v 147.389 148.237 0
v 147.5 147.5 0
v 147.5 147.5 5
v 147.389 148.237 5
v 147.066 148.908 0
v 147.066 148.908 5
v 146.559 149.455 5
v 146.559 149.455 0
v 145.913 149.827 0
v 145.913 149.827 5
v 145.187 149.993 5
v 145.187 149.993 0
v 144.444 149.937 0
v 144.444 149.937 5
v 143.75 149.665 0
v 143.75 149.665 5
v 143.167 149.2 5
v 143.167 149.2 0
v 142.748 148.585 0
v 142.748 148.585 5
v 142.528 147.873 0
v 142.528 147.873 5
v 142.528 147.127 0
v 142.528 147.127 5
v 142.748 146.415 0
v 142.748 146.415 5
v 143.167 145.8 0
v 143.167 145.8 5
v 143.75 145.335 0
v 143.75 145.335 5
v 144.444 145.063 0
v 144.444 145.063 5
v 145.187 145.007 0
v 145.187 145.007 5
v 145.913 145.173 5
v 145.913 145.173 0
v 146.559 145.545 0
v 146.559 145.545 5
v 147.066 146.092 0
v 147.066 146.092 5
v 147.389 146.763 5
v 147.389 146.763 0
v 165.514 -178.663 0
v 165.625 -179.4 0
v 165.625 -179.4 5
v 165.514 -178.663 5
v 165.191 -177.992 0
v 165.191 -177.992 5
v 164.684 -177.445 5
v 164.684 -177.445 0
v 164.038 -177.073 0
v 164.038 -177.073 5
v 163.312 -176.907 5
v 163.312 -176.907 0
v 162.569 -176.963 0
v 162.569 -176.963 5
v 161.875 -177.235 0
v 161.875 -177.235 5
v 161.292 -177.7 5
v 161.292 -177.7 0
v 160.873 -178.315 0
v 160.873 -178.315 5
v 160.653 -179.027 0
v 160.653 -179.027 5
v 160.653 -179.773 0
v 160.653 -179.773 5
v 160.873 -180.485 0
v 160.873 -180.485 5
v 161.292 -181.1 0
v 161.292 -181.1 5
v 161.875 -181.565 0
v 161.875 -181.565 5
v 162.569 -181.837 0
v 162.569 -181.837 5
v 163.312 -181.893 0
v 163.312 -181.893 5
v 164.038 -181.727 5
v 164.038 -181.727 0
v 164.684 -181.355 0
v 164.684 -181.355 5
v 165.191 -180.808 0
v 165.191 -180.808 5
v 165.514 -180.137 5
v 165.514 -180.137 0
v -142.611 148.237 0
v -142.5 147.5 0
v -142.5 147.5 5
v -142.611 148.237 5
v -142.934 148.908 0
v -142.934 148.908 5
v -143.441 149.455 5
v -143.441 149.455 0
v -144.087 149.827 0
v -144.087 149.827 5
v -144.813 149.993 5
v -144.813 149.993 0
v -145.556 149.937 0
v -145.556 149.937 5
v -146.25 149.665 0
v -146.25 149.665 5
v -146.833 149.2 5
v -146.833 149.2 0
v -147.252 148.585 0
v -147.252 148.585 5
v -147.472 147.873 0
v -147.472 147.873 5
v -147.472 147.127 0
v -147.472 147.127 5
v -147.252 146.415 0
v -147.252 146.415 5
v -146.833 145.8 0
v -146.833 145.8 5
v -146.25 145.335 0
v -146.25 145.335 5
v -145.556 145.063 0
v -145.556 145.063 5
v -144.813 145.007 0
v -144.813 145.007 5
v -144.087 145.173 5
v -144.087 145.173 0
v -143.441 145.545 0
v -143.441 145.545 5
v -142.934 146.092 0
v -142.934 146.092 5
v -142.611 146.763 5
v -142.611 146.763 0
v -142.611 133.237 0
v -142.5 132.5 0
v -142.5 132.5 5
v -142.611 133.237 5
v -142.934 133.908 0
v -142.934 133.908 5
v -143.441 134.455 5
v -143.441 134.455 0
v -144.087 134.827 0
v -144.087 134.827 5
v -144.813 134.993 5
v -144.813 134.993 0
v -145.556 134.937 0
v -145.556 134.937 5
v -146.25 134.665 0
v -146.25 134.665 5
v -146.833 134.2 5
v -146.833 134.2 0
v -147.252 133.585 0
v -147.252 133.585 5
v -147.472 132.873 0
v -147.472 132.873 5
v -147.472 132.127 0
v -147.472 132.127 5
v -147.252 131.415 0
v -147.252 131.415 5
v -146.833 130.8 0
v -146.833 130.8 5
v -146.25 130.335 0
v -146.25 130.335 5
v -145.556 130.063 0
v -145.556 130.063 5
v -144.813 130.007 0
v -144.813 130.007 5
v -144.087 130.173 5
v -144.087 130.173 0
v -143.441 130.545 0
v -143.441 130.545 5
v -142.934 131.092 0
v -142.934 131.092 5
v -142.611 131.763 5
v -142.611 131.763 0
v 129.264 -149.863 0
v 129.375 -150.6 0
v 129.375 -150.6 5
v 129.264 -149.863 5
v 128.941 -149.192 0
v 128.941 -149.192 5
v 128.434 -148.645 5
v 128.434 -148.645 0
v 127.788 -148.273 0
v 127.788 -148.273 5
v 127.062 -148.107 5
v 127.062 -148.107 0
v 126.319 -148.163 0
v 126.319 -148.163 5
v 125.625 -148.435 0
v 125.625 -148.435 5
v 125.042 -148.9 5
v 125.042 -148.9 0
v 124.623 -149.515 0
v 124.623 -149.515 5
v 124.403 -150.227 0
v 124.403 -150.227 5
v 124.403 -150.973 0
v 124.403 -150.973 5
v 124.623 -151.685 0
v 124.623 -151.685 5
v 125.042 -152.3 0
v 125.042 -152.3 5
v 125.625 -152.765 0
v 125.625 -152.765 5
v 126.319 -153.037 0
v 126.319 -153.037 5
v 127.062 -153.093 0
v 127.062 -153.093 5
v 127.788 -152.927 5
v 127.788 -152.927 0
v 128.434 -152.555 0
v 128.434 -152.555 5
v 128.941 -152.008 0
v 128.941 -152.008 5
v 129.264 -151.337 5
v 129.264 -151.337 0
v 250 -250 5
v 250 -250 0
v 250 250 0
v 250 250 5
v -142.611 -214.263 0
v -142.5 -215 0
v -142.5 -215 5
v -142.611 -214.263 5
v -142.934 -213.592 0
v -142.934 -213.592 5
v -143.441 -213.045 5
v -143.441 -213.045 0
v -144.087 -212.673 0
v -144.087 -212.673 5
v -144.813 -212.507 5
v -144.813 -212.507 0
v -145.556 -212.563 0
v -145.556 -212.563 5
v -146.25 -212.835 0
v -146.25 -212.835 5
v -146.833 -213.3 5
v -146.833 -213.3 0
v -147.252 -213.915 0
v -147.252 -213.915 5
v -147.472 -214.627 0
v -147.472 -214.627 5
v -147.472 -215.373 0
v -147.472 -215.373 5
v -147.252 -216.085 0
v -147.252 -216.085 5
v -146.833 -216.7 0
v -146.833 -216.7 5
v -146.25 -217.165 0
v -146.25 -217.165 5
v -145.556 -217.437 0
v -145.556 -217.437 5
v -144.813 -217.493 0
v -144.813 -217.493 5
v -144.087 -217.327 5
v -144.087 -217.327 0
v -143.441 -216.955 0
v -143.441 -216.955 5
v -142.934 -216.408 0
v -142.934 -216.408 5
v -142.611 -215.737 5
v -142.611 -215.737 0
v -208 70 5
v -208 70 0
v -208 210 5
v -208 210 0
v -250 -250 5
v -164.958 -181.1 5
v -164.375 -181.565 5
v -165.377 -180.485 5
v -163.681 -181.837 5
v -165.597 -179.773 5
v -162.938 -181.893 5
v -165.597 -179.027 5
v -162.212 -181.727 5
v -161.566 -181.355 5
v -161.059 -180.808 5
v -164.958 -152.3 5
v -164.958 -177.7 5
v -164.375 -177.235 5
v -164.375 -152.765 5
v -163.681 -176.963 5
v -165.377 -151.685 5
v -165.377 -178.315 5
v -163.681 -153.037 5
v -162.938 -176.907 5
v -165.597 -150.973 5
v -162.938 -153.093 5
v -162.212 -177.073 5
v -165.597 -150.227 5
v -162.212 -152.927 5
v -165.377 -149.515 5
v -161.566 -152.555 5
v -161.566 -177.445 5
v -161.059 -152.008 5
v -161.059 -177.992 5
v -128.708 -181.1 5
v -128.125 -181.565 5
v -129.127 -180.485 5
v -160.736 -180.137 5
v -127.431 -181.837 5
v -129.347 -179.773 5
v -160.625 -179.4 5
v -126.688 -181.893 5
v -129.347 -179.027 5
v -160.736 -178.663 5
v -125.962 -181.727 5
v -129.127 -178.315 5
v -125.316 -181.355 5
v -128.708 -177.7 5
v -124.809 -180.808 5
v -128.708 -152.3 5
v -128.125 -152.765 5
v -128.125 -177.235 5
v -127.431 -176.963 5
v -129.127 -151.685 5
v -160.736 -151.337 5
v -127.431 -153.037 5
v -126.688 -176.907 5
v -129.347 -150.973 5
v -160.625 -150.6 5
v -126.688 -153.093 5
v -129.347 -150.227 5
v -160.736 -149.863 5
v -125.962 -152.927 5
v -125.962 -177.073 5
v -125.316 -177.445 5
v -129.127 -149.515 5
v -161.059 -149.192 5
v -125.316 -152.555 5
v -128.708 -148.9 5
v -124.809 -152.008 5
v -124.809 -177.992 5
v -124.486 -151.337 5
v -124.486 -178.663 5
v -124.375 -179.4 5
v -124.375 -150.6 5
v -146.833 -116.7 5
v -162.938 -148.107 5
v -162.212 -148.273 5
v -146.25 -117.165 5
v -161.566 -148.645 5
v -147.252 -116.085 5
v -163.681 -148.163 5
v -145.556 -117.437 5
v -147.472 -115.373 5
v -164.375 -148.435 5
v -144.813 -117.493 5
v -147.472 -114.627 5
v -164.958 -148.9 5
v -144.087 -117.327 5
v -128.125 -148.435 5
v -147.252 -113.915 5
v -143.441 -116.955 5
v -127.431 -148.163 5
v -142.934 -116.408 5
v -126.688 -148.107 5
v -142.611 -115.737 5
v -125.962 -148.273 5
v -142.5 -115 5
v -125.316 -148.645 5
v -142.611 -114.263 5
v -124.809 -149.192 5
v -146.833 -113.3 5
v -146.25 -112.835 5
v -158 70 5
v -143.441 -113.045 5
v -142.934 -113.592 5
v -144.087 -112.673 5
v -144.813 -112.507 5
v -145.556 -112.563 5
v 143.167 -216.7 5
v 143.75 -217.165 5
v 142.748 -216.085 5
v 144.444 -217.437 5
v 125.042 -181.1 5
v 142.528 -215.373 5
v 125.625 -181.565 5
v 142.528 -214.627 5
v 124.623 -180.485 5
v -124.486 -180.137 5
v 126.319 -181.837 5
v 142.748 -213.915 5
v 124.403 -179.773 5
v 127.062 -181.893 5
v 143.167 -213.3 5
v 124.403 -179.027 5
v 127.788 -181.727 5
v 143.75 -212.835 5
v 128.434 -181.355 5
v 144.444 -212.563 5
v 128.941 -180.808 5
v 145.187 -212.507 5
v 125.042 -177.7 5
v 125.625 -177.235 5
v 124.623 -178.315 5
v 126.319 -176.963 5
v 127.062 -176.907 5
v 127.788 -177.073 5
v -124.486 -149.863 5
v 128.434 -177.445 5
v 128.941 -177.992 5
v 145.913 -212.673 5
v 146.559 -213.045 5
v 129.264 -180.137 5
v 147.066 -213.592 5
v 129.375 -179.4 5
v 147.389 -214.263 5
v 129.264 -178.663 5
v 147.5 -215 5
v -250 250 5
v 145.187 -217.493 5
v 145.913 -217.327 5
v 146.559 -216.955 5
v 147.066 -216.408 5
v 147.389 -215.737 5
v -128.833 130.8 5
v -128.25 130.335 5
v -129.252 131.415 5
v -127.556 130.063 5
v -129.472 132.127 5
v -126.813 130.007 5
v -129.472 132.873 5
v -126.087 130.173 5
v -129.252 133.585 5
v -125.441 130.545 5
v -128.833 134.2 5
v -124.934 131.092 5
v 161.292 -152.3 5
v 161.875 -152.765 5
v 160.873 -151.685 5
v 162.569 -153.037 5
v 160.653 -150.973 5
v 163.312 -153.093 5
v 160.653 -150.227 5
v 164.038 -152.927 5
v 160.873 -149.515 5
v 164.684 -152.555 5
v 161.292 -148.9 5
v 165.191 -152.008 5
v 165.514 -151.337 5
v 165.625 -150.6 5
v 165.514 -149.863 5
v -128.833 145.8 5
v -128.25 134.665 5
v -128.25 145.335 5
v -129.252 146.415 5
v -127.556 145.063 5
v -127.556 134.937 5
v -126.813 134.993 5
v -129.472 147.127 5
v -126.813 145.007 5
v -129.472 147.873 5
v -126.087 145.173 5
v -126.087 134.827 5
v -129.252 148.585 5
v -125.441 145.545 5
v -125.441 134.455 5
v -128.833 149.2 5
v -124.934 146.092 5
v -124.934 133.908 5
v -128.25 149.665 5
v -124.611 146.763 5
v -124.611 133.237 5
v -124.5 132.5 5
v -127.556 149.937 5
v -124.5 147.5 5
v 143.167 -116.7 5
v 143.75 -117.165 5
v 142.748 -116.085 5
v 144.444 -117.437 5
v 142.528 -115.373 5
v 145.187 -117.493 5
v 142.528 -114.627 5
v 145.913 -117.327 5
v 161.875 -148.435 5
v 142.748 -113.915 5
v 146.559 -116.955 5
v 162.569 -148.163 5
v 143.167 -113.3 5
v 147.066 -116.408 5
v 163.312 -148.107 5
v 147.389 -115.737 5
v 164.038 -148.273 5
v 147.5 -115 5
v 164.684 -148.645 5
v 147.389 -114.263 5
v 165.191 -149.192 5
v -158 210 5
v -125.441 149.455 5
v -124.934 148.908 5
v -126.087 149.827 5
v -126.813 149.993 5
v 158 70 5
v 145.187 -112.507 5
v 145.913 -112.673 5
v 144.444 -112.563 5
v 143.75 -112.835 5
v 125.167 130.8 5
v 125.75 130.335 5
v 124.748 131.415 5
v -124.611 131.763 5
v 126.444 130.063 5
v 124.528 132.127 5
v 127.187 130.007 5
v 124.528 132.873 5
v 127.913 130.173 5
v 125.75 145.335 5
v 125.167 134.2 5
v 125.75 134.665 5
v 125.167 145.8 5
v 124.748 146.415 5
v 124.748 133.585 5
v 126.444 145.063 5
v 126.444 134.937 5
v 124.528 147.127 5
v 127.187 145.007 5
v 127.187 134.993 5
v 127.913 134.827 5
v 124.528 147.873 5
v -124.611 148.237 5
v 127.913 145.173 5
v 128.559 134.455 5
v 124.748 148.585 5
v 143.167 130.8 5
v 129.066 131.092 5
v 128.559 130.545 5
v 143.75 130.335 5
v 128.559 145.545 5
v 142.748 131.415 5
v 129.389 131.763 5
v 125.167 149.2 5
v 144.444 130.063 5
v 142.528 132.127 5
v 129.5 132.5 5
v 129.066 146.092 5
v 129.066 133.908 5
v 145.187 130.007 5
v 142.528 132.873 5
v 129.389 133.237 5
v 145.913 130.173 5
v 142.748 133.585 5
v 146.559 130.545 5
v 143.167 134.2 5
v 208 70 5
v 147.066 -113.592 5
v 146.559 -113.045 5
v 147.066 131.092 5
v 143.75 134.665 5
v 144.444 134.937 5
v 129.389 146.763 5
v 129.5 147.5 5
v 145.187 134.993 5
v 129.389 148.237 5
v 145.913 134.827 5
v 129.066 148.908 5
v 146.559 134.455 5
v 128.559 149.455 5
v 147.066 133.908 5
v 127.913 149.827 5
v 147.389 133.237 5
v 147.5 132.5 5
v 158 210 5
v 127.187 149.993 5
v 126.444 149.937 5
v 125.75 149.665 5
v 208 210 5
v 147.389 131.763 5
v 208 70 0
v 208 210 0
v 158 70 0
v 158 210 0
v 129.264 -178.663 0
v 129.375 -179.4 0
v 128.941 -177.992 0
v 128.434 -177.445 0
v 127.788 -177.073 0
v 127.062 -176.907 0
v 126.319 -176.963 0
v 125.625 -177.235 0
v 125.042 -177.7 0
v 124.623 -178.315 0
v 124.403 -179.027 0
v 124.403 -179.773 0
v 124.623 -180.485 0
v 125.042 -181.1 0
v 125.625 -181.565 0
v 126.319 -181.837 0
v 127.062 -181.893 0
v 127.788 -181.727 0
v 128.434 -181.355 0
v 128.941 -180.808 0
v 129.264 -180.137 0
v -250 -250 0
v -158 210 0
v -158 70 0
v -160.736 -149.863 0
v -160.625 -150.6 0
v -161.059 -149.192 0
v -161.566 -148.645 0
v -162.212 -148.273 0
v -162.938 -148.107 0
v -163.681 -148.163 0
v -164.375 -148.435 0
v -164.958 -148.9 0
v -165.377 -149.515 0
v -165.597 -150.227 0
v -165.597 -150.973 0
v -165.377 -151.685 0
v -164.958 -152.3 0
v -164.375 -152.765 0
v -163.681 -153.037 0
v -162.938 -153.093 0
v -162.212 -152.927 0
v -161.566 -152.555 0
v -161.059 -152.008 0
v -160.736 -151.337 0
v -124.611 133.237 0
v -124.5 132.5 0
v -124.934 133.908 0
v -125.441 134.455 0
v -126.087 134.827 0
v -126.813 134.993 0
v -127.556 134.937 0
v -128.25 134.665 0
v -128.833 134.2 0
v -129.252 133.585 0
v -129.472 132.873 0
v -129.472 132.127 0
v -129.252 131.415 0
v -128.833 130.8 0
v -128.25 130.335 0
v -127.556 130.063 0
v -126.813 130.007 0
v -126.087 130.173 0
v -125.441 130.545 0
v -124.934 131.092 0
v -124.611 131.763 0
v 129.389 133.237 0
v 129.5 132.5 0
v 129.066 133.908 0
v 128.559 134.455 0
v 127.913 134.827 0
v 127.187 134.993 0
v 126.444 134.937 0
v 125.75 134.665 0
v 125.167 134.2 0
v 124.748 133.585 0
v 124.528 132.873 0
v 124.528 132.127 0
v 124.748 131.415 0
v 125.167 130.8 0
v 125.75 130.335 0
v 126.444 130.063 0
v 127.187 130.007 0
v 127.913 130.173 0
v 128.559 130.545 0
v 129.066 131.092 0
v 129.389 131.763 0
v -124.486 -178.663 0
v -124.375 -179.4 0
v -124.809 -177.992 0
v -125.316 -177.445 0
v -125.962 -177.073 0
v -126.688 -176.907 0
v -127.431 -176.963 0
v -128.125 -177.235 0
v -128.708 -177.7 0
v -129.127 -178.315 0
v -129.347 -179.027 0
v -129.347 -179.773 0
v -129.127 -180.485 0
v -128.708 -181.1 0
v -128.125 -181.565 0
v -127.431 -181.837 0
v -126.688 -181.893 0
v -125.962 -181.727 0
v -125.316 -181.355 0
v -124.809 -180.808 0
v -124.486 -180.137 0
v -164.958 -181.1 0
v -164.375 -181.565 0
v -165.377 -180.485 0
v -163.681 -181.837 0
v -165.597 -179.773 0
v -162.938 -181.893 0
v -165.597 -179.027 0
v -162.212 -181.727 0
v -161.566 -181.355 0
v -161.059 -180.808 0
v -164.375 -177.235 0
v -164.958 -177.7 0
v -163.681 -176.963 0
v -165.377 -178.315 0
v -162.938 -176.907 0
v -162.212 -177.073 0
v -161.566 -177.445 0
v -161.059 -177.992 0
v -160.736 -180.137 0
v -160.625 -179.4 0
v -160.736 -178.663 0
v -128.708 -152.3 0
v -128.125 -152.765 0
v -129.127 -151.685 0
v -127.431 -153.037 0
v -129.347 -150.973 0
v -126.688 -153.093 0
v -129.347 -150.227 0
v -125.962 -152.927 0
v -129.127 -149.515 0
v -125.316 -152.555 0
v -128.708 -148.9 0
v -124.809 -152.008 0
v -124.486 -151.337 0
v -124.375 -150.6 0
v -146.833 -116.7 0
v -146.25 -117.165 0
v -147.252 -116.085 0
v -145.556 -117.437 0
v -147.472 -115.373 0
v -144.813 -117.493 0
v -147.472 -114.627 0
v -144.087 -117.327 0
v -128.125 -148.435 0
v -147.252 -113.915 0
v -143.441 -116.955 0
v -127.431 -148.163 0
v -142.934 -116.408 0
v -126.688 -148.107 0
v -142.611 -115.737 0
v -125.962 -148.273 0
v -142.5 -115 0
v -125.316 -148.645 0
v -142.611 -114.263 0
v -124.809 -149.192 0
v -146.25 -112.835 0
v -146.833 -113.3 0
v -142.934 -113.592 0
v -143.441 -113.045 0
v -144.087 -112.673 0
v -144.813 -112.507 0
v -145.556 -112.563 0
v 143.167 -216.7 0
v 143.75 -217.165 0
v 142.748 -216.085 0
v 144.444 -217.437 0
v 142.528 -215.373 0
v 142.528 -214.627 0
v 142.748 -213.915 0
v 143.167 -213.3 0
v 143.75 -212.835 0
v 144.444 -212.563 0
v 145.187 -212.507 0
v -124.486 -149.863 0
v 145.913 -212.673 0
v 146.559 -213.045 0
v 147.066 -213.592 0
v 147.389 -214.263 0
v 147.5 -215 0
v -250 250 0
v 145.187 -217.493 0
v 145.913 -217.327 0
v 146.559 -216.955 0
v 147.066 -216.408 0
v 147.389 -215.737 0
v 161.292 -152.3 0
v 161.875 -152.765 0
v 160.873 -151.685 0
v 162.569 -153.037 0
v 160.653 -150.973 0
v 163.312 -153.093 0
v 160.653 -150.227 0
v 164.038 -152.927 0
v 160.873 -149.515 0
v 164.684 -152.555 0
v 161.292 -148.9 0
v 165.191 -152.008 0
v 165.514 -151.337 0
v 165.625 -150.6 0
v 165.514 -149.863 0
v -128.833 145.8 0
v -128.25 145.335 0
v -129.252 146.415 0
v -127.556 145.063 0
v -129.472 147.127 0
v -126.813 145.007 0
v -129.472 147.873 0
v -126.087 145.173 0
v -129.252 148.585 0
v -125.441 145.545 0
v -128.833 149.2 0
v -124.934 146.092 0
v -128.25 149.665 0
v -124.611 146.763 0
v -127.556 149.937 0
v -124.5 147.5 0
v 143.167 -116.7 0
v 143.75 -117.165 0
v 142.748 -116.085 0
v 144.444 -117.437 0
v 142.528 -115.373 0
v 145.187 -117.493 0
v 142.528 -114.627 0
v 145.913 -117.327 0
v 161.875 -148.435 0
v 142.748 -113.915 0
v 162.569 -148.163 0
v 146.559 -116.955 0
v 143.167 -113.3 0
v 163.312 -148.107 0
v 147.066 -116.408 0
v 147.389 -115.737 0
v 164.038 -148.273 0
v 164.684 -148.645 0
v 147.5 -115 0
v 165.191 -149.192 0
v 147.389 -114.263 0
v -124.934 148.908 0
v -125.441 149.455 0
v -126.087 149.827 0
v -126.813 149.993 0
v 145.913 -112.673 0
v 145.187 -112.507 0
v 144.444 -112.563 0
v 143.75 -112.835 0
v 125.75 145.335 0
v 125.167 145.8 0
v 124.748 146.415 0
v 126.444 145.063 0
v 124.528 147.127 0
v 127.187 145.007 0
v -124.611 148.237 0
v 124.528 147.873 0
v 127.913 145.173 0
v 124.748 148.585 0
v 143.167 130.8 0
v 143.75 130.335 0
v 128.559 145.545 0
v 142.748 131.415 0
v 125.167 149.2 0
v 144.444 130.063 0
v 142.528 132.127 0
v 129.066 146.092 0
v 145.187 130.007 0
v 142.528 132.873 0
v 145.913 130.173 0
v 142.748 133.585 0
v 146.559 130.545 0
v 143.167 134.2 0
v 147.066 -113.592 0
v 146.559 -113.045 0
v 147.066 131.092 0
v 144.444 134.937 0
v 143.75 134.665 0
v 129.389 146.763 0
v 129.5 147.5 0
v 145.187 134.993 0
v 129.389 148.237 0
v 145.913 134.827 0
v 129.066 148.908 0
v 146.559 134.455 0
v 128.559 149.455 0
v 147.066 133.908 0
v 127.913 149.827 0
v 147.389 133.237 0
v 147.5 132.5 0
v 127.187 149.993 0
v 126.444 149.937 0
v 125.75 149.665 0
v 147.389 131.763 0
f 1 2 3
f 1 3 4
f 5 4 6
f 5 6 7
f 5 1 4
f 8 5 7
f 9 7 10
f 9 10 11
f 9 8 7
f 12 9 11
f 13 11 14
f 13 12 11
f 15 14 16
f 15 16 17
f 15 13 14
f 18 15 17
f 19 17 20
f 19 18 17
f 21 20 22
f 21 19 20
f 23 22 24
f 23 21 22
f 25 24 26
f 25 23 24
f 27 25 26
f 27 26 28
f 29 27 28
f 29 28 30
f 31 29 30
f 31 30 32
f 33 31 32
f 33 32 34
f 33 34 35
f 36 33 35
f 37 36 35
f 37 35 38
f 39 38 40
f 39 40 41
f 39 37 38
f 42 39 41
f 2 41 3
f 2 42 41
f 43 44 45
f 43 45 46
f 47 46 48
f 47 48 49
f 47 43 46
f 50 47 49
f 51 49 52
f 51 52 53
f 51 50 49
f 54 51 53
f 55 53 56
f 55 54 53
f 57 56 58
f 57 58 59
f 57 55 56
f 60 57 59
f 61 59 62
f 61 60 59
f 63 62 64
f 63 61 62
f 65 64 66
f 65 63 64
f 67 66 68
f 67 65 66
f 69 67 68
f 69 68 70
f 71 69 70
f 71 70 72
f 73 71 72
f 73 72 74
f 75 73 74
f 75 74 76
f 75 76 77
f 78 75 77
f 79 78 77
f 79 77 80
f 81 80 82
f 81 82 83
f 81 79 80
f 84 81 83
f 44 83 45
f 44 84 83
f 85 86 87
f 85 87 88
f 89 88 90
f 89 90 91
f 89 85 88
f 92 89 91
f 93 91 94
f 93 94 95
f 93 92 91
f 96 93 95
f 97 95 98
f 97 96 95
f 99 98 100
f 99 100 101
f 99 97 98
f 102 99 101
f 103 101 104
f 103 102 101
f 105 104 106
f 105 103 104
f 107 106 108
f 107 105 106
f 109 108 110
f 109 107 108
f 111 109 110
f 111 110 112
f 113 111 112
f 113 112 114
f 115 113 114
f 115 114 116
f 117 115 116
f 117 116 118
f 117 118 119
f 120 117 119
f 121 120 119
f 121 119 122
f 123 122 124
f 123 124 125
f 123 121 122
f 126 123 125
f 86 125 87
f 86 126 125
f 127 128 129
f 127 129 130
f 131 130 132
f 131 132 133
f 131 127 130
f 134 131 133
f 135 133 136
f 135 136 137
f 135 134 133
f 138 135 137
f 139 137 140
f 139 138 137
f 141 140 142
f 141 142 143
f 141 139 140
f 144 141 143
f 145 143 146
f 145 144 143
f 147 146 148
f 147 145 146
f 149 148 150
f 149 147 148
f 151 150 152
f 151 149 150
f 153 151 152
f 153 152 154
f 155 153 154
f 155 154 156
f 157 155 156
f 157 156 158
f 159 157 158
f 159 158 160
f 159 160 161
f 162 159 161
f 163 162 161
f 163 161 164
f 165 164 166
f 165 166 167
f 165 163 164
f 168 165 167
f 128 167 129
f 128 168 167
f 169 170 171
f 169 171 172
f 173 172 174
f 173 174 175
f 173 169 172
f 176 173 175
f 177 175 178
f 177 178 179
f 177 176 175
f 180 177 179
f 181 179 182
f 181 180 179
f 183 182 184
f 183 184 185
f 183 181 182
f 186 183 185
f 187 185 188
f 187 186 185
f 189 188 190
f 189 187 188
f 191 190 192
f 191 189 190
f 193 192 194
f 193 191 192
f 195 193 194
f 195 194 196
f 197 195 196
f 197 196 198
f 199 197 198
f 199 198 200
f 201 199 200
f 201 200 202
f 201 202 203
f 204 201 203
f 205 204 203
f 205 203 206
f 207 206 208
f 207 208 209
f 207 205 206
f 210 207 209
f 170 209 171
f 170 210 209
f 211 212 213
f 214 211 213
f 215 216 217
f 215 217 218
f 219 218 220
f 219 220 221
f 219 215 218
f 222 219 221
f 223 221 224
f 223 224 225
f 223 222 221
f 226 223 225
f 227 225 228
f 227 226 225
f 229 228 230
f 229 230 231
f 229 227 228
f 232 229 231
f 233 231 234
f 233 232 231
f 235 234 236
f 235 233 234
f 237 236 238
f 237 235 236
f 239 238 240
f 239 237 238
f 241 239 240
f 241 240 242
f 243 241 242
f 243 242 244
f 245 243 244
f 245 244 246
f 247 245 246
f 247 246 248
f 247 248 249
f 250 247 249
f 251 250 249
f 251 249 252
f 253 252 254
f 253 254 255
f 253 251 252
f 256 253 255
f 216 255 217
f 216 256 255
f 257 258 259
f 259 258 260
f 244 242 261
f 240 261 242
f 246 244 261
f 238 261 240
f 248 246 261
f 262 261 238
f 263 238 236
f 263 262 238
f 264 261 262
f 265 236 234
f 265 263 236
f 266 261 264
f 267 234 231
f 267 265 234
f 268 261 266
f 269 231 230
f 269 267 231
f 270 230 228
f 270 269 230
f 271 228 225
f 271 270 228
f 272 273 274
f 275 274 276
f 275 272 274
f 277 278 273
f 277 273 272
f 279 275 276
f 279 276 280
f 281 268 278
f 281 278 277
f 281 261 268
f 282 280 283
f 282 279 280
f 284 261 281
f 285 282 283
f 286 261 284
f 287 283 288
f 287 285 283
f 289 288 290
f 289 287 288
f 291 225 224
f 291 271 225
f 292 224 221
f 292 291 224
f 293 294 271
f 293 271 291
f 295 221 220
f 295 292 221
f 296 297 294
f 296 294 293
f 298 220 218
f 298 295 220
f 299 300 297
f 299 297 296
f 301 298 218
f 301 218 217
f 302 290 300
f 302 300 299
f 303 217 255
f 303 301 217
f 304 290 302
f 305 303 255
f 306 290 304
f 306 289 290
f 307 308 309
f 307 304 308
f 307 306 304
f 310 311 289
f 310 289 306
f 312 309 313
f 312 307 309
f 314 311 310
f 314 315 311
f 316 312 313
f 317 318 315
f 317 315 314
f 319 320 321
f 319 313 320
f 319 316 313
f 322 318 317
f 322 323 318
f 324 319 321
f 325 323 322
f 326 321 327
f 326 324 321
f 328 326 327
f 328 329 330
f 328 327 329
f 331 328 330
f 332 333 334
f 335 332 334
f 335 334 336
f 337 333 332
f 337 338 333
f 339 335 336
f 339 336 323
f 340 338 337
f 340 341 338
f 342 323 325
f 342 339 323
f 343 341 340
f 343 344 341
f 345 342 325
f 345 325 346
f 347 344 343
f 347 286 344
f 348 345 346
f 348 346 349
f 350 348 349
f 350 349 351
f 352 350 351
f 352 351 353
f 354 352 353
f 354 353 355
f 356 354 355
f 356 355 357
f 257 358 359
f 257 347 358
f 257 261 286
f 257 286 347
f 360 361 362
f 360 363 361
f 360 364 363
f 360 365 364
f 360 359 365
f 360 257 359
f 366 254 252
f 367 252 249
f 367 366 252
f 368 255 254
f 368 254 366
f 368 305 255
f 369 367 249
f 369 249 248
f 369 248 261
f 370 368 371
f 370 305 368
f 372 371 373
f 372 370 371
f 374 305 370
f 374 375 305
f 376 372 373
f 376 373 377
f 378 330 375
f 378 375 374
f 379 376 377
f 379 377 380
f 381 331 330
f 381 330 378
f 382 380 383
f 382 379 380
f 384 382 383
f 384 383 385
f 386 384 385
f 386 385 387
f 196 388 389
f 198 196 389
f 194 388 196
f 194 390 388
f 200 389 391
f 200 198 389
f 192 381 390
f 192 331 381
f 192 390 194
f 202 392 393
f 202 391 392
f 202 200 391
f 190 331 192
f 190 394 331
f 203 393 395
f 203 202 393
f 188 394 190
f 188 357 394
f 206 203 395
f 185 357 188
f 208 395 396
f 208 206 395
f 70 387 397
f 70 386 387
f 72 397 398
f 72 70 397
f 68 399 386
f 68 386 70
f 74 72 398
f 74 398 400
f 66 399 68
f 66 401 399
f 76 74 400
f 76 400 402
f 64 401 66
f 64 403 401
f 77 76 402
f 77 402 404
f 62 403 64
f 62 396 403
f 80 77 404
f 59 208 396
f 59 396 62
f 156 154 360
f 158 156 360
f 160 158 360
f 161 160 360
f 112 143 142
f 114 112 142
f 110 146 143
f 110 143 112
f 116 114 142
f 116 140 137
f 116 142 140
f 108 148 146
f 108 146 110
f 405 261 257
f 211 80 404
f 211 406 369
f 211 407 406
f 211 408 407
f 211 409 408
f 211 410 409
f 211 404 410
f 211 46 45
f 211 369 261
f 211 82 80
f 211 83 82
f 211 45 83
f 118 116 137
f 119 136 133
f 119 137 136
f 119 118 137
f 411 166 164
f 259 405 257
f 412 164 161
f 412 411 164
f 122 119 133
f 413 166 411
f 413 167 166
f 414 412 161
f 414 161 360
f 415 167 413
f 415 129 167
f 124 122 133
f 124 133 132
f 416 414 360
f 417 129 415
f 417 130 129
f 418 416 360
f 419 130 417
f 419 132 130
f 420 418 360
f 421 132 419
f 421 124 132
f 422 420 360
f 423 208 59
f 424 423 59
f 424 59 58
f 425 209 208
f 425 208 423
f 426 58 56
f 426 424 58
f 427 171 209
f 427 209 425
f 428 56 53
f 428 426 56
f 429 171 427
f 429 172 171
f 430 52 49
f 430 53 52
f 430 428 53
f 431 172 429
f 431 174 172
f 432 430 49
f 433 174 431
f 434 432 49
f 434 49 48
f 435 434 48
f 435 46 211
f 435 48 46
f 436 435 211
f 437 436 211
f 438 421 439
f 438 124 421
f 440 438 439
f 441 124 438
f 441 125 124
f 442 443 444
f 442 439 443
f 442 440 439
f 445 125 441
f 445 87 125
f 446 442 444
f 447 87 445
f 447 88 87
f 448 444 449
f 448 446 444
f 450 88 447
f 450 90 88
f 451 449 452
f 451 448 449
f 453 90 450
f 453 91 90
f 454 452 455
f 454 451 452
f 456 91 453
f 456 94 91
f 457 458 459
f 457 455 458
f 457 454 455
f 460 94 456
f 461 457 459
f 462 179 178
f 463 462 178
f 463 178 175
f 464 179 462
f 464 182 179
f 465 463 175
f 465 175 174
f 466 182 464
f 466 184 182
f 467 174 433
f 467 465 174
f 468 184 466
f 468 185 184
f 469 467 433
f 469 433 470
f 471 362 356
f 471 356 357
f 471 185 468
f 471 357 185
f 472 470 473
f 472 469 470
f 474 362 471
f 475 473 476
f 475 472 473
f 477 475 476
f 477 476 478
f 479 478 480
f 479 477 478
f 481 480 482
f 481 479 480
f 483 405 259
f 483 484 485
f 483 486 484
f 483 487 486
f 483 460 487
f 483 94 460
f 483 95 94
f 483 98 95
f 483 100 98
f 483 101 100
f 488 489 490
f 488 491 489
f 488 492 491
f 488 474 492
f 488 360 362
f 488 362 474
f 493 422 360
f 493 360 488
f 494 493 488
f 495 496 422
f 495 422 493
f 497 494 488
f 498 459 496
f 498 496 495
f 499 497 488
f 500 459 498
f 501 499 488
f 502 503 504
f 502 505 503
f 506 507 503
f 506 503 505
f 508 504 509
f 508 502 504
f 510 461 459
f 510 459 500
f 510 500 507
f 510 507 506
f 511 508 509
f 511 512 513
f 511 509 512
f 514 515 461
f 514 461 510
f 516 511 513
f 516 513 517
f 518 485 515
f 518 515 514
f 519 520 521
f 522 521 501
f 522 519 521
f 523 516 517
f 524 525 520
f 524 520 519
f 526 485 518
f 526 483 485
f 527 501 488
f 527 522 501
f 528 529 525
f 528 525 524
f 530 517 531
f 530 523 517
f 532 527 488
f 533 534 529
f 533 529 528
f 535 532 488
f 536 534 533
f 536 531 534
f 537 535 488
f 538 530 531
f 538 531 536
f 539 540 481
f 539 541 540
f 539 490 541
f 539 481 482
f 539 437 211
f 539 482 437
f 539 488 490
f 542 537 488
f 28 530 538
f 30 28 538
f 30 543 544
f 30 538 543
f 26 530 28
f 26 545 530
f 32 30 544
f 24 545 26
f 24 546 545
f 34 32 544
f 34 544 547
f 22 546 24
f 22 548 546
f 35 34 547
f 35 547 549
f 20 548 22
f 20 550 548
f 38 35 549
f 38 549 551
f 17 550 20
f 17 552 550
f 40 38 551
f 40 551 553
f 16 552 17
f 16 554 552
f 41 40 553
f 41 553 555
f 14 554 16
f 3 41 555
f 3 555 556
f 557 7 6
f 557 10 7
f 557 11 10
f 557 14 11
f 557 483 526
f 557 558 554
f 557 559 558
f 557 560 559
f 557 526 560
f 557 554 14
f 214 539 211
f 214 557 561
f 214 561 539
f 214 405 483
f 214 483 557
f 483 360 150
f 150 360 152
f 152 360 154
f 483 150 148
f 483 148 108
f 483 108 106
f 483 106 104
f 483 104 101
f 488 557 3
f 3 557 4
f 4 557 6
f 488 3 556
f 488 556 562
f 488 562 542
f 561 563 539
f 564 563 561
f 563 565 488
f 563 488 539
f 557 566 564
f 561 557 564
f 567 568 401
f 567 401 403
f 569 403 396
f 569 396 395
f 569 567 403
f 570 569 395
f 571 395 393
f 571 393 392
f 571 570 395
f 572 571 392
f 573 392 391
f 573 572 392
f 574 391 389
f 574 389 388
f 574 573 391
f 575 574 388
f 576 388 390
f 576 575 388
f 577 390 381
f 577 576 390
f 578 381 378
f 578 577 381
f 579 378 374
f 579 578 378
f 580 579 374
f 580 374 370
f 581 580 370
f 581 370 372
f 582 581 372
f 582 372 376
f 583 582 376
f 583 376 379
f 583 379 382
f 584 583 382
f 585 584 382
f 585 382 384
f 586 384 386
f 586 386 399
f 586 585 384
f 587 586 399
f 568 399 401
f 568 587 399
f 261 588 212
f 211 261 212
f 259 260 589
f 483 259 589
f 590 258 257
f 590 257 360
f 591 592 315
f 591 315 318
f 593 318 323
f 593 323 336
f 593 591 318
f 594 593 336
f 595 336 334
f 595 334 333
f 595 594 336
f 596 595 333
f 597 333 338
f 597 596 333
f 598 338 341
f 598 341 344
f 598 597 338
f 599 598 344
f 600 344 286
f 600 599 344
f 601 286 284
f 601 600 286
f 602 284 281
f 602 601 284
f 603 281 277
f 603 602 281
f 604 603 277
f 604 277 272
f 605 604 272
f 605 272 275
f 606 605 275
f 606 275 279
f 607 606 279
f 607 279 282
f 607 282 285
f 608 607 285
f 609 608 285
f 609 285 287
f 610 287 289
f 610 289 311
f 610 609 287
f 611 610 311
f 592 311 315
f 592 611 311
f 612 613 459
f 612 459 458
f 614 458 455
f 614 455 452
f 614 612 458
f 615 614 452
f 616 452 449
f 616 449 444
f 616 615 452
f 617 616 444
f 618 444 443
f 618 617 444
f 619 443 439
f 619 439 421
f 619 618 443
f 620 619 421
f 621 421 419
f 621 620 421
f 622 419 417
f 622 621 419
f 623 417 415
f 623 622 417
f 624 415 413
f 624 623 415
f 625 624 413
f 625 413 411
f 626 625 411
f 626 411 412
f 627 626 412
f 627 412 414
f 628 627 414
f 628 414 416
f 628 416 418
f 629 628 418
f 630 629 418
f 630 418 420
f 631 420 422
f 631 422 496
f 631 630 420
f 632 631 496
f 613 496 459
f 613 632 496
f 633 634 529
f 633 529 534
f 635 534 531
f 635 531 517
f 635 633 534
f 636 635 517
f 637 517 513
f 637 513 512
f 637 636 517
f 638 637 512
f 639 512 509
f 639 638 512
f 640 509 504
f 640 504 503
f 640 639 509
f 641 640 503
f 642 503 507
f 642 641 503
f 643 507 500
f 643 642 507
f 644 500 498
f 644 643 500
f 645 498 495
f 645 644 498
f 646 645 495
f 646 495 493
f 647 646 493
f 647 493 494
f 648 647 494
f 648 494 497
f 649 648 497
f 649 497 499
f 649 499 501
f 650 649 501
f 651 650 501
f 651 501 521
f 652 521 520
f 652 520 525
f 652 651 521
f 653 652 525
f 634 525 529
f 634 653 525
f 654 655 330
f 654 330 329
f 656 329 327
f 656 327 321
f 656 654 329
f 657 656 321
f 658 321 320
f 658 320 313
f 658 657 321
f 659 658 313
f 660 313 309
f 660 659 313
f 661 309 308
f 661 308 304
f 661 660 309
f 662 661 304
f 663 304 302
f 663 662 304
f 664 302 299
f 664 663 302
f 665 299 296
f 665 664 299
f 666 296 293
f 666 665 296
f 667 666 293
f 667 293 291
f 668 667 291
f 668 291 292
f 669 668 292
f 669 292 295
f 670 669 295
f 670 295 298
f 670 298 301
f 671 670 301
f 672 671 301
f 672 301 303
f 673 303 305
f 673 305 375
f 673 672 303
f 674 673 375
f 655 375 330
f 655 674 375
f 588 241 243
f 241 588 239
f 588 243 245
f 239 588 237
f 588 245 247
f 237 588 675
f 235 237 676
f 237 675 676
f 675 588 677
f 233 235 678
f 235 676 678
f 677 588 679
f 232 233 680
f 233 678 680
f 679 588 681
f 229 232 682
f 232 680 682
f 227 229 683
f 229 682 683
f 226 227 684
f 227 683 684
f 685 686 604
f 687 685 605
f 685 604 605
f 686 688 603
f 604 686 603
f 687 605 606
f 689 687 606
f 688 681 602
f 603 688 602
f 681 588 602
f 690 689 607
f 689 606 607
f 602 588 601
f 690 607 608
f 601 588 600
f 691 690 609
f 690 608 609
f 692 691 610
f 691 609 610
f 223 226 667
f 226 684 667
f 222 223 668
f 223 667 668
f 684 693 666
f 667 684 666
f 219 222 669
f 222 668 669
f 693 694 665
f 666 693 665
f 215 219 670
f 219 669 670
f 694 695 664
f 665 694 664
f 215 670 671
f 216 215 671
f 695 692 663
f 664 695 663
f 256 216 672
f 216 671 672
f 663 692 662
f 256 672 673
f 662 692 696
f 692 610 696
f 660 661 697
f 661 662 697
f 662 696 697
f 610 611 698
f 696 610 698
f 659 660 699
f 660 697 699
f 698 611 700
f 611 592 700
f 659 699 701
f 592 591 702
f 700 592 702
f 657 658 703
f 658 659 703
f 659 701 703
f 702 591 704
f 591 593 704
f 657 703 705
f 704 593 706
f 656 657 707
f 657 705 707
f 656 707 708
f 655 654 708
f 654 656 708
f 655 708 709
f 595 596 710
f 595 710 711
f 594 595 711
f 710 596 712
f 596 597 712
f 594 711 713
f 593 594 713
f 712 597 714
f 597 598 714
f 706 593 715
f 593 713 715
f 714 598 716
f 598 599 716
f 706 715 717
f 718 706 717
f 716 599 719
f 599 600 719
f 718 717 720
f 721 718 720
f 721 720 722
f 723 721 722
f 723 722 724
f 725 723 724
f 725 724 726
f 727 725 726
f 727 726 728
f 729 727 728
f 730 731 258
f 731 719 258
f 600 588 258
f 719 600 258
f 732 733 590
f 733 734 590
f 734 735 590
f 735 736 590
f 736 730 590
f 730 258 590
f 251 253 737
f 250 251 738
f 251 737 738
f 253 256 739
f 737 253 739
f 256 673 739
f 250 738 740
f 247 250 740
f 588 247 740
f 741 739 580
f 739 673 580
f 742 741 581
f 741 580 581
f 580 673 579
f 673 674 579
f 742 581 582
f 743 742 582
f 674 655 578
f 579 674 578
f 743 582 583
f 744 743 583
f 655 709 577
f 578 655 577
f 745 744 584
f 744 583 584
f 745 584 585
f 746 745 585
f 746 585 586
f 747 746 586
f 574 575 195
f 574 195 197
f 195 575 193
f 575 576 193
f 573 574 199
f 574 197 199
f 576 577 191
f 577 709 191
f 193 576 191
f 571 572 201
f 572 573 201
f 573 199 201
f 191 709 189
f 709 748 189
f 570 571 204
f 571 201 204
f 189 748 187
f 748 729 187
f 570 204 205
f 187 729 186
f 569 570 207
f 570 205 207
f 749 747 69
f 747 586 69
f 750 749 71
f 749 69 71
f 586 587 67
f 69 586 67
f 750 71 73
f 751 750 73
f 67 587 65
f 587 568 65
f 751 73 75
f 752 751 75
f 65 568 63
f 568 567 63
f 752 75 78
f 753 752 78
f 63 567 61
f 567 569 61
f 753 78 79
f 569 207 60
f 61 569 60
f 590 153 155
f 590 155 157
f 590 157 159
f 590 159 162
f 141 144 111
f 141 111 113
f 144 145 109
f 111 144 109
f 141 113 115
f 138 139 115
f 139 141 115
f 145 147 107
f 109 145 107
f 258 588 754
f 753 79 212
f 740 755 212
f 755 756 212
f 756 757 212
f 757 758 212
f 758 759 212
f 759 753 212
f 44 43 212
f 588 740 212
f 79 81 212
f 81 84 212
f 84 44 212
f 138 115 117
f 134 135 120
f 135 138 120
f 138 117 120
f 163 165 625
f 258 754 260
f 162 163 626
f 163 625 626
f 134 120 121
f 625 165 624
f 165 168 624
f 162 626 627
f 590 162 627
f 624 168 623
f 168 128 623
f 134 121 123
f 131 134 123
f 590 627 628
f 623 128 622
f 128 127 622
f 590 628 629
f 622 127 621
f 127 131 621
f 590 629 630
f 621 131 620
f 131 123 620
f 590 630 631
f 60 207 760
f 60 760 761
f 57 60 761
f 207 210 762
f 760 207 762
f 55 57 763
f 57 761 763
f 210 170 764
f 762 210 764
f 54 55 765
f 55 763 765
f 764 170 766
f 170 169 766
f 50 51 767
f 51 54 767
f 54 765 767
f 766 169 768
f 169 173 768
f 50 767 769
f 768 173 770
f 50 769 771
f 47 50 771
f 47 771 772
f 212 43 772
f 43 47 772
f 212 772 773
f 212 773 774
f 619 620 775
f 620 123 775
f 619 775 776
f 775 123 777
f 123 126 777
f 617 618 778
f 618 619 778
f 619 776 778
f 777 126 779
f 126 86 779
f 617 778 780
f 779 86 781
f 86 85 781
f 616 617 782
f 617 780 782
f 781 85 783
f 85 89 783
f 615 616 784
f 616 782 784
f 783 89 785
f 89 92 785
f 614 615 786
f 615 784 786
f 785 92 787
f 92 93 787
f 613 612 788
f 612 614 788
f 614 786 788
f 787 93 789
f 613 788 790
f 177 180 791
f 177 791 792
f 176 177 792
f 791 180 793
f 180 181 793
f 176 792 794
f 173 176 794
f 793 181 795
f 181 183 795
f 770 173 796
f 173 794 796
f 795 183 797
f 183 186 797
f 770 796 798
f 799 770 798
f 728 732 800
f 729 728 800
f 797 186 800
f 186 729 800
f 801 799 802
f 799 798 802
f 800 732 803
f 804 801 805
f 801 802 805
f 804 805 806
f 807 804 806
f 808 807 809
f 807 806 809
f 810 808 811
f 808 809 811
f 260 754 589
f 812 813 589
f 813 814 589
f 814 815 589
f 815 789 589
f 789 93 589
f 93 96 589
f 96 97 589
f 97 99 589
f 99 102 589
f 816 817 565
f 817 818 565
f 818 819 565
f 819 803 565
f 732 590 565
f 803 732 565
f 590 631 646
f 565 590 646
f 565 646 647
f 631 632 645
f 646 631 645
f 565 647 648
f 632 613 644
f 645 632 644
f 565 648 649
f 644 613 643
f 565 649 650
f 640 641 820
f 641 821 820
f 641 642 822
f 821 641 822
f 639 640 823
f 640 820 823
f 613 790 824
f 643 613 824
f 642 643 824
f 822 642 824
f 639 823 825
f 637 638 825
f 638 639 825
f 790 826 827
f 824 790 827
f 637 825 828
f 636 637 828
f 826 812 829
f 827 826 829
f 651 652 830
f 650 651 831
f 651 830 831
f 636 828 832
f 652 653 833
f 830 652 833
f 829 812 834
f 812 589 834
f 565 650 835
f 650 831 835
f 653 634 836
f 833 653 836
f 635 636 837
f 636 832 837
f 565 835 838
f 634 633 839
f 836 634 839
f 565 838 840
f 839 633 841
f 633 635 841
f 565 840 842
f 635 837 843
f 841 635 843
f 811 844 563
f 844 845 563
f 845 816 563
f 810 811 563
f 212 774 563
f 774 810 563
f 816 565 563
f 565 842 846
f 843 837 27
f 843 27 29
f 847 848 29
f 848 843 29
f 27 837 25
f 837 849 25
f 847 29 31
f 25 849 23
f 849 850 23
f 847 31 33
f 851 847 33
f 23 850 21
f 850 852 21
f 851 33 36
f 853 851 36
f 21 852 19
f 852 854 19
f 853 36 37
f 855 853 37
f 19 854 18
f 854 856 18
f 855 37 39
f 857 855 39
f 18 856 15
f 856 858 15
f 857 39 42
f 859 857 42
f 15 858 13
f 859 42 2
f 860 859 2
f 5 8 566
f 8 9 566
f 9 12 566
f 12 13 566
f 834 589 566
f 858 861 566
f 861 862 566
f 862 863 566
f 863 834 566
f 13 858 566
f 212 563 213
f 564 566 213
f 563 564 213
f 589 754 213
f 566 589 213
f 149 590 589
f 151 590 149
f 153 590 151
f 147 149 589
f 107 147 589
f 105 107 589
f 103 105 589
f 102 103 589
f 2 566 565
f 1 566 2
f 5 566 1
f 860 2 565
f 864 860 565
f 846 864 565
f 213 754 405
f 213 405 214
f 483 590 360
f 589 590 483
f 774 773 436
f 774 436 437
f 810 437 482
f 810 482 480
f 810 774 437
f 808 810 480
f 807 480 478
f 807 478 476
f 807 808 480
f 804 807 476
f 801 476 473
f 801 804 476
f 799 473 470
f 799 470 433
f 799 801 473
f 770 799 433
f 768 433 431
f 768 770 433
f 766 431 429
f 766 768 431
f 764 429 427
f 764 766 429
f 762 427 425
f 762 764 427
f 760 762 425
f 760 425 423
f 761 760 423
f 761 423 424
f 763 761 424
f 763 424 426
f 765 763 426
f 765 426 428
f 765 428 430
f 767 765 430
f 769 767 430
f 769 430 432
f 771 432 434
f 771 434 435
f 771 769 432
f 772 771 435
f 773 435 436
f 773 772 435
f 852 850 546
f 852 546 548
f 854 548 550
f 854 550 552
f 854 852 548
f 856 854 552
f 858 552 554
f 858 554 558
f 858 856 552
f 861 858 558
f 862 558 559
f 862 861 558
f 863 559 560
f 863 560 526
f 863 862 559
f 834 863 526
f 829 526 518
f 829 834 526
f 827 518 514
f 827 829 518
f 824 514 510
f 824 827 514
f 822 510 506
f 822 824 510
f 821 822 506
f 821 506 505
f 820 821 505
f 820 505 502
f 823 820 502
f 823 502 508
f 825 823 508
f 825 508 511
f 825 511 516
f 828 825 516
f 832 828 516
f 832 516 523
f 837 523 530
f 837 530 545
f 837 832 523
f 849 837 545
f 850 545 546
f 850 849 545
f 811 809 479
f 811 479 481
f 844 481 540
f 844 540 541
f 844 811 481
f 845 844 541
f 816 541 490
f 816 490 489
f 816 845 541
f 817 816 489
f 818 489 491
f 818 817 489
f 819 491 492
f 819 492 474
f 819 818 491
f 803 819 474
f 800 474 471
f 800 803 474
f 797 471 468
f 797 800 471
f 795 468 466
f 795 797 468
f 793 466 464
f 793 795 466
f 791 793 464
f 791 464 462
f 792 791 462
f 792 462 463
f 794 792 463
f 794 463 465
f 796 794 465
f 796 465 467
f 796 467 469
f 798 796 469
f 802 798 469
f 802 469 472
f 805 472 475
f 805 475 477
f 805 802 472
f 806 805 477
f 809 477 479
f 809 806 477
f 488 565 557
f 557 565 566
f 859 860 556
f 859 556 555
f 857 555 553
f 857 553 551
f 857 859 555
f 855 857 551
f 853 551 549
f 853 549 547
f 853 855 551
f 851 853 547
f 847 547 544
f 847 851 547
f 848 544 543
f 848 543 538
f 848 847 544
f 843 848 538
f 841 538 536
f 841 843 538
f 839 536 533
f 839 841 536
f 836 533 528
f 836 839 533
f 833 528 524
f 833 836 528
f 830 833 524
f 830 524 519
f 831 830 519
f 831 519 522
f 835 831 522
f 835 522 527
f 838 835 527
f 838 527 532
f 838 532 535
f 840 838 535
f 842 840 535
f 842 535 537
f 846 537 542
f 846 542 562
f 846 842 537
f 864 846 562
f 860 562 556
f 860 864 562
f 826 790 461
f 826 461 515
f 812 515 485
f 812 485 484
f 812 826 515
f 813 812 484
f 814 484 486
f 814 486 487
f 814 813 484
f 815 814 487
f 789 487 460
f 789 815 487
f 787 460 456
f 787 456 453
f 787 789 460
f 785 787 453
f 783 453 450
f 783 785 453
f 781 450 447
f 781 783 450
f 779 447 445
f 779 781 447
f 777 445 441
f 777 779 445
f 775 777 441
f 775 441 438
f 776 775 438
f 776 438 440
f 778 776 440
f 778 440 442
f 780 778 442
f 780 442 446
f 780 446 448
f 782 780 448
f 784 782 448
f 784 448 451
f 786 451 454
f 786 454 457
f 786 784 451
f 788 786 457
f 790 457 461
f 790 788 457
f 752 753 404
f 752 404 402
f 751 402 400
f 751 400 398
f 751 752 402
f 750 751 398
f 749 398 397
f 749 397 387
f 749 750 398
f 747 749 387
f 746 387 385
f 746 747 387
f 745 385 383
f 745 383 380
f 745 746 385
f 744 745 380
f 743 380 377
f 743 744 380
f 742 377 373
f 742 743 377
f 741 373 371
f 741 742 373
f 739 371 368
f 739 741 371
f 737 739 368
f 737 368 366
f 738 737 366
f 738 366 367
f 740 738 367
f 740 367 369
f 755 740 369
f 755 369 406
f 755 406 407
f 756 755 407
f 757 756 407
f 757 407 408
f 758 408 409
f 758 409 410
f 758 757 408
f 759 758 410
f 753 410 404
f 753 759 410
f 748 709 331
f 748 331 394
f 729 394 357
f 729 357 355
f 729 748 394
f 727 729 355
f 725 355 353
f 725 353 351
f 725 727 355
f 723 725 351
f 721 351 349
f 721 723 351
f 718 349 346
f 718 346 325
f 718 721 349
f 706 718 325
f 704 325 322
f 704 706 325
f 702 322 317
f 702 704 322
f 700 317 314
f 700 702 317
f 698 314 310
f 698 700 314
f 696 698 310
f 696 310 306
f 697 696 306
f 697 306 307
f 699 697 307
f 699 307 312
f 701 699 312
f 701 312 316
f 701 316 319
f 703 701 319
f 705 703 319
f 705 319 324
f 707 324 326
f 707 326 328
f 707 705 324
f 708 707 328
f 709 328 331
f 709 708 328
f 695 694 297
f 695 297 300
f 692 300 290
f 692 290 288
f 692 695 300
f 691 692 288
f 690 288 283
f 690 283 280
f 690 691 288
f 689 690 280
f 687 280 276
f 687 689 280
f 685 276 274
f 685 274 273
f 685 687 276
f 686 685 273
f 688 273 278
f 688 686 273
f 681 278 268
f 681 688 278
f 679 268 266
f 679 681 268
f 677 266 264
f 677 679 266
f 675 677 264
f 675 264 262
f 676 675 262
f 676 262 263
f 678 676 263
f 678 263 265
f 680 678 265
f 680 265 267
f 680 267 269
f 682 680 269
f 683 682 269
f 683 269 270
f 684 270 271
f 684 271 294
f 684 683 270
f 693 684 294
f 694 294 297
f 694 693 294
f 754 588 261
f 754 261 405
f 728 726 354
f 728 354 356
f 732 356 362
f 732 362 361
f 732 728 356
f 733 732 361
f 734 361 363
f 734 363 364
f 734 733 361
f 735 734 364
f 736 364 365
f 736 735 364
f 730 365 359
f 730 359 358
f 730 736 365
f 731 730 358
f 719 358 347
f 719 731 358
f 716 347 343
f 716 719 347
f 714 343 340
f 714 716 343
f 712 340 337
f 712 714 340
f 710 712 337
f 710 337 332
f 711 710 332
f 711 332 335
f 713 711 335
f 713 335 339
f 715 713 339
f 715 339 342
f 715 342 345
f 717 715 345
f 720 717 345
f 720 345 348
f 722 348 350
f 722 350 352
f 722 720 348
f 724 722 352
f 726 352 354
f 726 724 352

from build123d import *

# Parameters (mm, degrees)
SKETCH1_W           = 500
SKETCH1_H           = 500
SKETCH1_R           = 2.5
SKETCH1_W_2         = 50
SKETCH1_H_2         = 140
BOSS_EXTRUDE1_DEPTH = 5
CUT_EXTRUDE1_START  = -5
SKETCH2_R           = 2.5
CUT_EXTRUDE1_DEPTH  = 5


with BuildPart() as part:
    # Sketch1 → Boss-Extrude1 (new body)
    with BuildSketch(Plane.XY):
        Rectangle(SKETCH1_W, SKETCH1_H)
        with Locations((127, 147.5)):
            Circle(SKETCH1_R, mode=Mode.SUBTRACT)
        with Locations((127, 132.5)):
            Circle(SKETCH1_R, mode=Mode.SUBTRACT)
        with Locations((145, 132.5)):
            Circle(SKETCH1_R, mode=Mode.SUBTRACT)
        with Locations((145, 147.5)):
            Circle(SKETCH1_R, mode=Mode.SUBTRACT)
        with Locations((-145, 147.5)):
            Circle(SKETCH1_R, mode=Mode.SUBTRACT)
        with Locations((-145, 132.5)):
            Circle(SKETCH1_R, mode=Mode.SUBTRACT)
        with Locations((-127, 132.5)):
            Circle(SKETCH1_R, mode=Mode.SUBTRACT)
        with Locations((-127, 147.5)):
            Circle(SKETCH1_R, mode=Mode.SUBTRACT)
        with Locations((183, 140)):
            Rectangle(SKETCH1_W_2, SKETCH1_H_2, mode=Mode.SUBTRACT)
        with Locations((-183, 140)):
            Rectangle(SKETCH1_W_2, SKETCH1_H_2, mode=Mode.SUBTRACT)
    extrude(amount=BOSS_EXTRUDE1_DEPTH)

    # Sketch2 → Cut-Extrude1 (cut)
    with BuildSketch(Plane.XY.offset(5).offset(CUT_EXTRUDE1_START)):
        with Locations((-145, 132.5)):
            Circle(SKETCH2_R)
        with Locations((-163.125, -150.6)):
            Circle(SKETCH2_R)
        with Locations((-126.875, -150.6)):
            Circle(SKETCH2_R)
        with Locations((-126.875, -179.4)):
            Circle(SKETCH2_R)
        with Locations((-163.125, -179.4)):
            Circle(SKETCH2_R)
        with Locations((-145, -115)):
            Circle(SKETCH2_R)
        with Locations((-145, -215)):
            Circle(SKETCH2_R)
        with Locations((145, -215)):
            Circle(SKETCH2_R)
        with Locations((145, -115)):
            Circle(SKETCH2_R)
        with Locations((163.125, -179.4)):
            Circle(SKETCH2_R)
        with Locations((126.875, -179.4)):
            Circle(SKETCH2_R)
        with Locations((126.875, -150.6)):
            Circle(SKETCH2_R)
        with Locations((163.125, -150.6)):
            Circle(SKETCH2_R)
    extrude(amount=CUT_EXTRUDE1_DEPTH, mode=Mode.SUBTRACT)


solid = part.part
